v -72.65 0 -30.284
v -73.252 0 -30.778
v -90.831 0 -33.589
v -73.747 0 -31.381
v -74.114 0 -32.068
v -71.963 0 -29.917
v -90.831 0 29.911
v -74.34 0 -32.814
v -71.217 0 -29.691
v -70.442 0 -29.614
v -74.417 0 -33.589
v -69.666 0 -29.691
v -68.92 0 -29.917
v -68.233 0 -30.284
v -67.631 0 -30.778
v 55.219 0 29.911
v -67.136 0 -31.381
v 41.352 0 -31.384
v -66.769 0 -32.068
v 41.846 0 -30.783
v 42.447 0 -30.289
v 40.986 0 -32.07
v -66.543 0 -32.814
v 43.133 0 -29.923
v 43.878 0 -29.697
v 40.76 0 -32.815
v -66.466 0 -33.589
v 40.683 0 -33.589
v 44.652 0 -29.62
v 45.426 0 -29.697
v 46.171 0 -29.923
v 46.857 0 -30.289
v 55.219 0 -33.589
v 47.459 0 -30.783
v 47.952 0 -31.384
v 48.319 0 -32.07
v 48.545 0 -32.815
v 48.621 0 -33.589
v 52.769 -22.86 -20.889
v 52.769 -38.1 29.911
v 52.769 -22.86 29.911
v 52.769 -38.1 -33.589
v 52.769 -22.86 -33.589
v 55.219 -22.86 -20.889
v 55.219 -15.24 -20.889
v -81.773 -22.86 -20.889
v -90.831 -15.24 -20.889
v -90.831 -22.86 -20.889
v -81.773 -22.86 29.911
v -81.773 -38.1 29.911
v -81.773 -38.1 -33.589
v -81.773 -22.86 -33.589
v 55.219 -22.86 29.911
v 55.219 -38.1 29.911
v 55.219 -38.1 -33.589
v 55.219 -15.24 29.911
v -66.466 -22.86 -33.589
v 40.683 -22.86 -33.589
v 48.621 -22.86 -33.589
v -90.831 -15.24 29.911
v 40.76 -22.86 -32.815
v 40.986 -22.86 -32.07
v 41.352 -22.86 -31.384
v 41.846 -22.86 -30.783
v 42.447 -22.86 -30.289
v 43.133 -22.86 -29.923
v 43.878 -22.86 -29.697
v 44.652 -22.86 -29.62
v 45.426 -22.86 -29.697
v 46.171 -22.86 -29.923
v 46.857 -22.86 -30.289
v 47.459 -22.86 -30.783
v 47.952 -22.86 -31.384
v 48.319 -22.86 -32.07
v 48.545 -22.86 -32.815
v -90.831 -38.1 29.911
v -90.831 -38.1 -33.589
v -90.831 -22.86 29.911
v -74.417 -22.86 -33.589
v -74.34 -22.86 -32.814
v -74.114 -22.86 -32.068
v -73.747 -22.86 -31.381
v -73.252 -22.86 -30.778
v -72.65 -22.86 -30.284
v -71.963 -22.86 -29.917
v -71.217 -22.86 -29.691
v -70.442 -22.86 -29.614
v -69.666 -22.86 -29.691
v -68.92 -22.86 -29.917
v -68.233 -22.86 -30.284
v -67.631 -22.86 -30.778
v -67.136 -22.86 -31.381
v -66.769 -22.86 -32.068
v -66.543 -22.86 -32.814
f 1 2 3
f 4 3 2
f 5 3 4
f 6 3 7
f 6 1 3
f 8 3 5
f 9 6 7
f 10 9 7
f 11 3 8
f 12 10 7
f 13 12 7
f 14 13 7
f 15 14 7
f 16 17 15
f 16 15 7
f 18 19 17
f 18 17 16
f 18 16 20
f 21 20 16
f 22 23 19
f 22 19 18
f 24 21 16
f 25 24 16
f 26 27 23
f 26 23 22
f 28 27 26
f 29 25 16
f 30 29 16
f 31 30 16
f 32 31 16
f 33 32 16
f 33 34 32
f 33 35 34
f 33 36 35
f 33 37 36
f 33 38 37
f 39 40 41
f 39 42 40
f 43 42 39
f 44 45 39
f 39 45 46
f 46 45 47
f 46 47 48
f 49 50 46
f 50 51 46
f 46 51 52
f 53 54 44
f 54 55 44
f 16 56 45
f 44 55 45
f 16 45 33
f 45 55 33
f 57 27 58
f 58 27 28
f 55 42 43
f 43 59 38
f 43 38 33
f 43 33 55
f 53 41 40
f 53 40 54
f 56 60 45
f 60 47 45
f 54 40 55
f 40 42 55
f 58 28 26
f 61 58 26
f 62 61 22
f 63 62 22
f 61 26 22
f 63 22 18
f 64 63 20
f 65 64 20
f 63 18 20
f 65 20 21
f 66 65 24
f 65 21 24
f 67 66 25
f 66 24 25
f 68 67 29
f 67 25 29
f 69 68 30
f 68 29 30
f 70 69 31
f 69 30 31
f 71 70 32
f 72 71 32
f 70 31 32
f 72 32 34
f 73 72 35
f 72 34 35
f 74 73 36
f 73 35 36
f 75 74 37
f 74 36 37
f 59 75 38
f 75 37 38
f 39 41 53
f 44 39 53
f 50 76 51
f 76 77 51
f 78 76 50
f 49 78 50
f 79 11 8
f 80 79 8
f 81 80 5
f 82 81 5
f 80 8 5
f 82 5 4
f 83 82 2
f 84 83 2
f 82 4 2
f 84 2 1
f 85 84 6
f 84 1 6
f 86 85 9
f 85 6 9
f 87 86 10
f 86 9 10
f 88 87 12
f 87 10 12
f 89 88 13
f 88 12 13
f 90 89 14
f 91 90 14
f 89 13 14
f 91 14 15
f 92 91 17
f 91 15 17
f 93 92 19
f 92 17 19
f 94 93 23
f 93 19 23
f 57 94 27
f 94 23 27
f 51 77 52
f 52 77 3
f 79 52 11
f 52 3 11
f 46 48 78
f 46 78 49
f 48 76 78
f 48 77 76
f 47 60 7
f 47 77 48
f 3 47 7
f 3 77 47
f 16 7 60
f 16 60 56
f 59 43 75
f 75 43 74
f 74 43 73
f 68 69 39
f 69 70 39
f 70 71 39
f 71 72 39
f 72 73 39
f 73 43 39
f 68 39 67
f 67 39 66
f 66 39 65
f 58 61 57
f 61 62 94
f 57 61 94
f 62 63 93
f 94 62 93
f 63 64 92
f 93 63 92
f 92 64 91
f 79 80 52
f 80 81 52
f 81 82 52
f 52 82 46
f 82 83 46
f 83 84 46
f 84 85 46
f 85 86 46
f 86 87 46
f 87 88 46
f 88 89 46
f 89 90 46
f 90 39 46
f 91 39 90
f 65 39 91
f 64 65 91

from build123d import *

# Parameters (mm, degrees)
F0_W       = 146.05
F0_H       = 25.4
F1_DEPTH   = 38.1
F2_W       = 7.62
F2_H       = 12.7
F1_FACE1_W = 38.1
F1_FACE1_H = 25.4
F3_DEPTH   = 146.051
F5_DEPTH   = 25.401
F6_W       = 146.05
F6_H       = 15.24
F7_DEPTH   = 38.1
F8_W       = 9.0582419944
F8_H       = 15.24
F9_DEPTH   = 38.1
F10_W      = 2.4497217488
F10_H      = 15.24
F11_DEPTH  = 38.1
F12_R      = 3.96875
F13_DEPTH  = 38.101


with BuildPart() as f1:
    # F0 (on Front) → F1 (new body)
    with BuildSketch(Plane.XZ):
        with Locations((-17.8064775685, -20.8892399079)):
            Rectangle(F0_W, F0_H)
    extrude(amount=F1_DEPTH)

    # F2 (on face) + F1_face1 (on face) → F3 (cut, through all)
    with BuildSketch(Plane(origin=(-90.8314775685, 0, 0), x_dir=(0, -1, 0), z_dir=(-1, 0, 0))):
        with Locations((19.05, -14.5392399079)):
            Rectangle(F2_W, F2_H)
    with BuildSketch(Plane(origin=(55.2185224315, -19.05, -20.8892399079), x_dir=(0, 1, 0), z_dir=(1, 0, 0))):
        Rectangle(F1_FACE1_W, F1_FACE1_H)
    extrude(amount=-F3_DEPTH, dir=(-1, 0, 0), mode=Mode.SUBTRACT)

    # F4 (on face) → F5 (cut, through all)
    with BuildSketch(Plane.XY.offset(-8.1892399079)):
        Polygon((52.7688006827, -22.86), (-81.7732355741, -22.86), (-81.7732355741, -38.1), (52.7688006827, -38.1), (52.7688006827, -30.48), align=None)
    extrude(amount=-F5_DEPTH, mode=Mode.SUBTRACT)

    # F6 (on face) → F7 (join)
    with BuildSketch(Plane.XY.offset(-8.1892399079)):
        with Locations((-17.8064775685, -7.62)):
            Rectangle(F6_W, F6_H)
    extrude(amount=F7_DEPTH)

    # F8 (on face) → F9 (join)
    with BuildSketch(Plane.XY.offset(-8.1892399079)):
        with Locations((-86.3023565713, -30.48)):
            Rectangle(F8_W, F8_H)
    extrude(amount=F9_DEPTH)

    # F10 (on face) → F11 (join)
    with BuildSketch(Plane.XY.offset(-8.1892399079)):
        with Locations((53.9936615571, -30.48)):
            Rectangle(F10_W, F10_H)
    extrude(amount=F11_DEPTH)

    # F12 (on face) → F13 (cut, through all)
    with BuildSketch(Plane(origin=(0, 0, 0), x_dir=(-1, 0, 0), z_dir=(0, 1, 0))):
        with Locations((-44.652171433, -33.5892399079)):
            Circle(F12_R)
        with BuildLine():
            ThreePointArc((66.466478567, -33.5892399079), (70.441578567, -37.5643399079), (74.416678567, -33.5892399079))
            ThreePointArc((74.416678567, -33.5892399079), (70.441578567, -29.6141399079), (66.466478567, -33.5892399079))
        make_face()
    extrude(amount=-F13_DEPTH, mode=Mode.SUBTRACT)


solid = f1.part
